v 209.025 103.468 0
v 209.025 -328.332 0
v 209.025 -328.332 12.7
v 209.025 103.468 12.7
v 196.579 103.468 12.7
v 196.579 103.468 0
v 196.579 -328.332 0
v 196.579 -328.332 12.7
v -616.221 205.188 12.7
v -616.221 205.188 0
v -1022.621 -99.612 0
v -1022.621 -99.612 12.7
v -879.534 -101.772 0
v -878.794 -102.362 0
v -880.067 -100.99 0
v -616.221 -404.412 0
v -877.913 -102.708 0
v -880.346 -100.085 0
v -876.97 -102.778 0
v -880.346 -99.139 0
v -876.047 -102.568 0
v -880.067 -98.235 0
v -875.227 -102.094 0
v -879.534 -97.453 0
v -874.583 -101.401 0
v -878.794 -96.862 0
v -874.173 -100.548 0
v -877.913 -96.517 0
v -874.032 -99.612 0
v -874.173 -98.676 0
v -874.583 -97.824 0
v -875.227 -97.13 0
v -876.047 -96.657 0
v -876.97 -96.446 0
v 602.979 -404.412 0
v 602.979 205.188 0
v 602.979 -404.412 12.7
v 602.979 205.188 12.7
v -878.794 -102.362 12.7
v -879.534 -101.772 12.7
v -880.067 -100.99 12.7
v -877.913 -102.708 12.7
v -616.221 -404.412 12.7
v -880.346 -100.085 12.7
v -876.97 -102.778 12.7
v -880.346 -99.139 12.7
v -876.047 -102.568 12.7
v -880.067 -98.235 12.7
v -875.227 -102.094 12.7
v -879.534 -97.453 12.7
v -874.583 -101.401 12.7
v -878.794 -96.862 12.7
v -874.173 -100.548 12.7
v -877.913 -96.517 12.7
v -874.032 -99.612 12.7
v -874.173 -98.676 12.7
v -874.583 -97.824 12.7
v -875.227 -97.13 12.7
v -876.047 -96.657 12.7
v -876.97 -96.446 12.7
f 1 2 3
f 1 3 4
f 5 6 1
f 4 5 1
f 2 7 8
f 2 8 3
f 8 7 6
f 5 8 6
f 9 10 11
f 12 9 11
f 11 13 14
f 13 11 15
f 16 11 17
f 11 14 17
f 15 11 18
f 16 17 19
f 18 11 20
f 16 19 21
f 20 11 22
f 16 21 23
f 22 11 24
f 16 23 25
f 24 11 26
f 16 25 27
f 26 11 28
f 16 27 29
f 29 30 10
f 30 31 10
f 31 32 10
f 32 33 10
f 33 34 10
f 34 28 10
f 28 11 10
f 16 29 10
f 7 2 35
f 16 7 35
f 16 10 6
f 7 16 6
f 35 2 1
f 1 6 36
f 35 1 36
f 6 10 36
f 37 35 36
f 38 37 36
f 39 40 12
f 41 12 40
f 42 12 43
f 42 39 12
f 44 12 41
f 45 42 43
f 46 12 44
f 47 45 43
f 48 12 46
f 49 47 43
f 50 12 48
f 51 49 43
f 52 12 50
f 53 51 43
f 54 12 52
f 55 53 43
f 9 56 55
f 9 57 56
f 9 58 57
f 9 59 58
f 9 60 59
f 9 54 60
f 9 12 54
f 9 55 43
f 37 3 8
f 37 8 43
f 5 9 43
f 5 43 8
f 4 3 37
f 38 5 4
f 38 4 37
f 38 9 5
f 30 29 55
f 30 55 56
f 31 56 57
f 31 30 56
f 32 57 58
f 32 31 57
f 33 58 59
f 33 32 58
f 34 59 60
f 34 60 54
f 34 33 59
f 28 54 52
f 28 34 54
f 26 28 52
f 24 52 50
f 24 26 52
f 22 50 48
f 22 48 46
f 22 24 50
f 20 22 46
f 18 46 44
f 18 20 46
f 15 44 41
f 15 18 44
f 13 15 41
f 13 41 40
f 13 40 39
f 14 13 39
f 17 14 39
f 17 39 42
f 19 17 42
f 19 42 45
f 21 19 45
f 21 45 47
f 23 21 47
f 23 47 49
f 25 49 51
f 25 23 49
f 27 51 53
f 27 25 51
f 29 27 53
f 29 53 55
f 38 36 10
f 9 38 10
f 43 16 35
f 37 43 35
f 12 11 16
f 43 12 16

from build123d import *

# Parameters (mm, degrees)
F0_W     = 12.446
F0_H     = 431.8
F0_R     = 3.175
F1_DEPTH = 12.7


with BuildPart() as f1:
    # F0 (on Top) → F1 (new body)
    with BuildSketch(Plane.XY):
        Polygon((602.978926, 205.187889), (-616.221074, 205.187889), (-1022.621074, -99.612111), (-616.221074, -404.412111), (602.978926, -404.412111), align=None)
        with Locations((202.801926, -112.431925)):
            Rectangle(F0_W, F0_H, mode=Mode.SUBTRACT)
        with Locations((-877.206781, -99.612111)):
            Circle(F0_R, mode=Mode.SUBTRACT)
    extrude(amount=F1_DEPTH)


solid = f1.part
